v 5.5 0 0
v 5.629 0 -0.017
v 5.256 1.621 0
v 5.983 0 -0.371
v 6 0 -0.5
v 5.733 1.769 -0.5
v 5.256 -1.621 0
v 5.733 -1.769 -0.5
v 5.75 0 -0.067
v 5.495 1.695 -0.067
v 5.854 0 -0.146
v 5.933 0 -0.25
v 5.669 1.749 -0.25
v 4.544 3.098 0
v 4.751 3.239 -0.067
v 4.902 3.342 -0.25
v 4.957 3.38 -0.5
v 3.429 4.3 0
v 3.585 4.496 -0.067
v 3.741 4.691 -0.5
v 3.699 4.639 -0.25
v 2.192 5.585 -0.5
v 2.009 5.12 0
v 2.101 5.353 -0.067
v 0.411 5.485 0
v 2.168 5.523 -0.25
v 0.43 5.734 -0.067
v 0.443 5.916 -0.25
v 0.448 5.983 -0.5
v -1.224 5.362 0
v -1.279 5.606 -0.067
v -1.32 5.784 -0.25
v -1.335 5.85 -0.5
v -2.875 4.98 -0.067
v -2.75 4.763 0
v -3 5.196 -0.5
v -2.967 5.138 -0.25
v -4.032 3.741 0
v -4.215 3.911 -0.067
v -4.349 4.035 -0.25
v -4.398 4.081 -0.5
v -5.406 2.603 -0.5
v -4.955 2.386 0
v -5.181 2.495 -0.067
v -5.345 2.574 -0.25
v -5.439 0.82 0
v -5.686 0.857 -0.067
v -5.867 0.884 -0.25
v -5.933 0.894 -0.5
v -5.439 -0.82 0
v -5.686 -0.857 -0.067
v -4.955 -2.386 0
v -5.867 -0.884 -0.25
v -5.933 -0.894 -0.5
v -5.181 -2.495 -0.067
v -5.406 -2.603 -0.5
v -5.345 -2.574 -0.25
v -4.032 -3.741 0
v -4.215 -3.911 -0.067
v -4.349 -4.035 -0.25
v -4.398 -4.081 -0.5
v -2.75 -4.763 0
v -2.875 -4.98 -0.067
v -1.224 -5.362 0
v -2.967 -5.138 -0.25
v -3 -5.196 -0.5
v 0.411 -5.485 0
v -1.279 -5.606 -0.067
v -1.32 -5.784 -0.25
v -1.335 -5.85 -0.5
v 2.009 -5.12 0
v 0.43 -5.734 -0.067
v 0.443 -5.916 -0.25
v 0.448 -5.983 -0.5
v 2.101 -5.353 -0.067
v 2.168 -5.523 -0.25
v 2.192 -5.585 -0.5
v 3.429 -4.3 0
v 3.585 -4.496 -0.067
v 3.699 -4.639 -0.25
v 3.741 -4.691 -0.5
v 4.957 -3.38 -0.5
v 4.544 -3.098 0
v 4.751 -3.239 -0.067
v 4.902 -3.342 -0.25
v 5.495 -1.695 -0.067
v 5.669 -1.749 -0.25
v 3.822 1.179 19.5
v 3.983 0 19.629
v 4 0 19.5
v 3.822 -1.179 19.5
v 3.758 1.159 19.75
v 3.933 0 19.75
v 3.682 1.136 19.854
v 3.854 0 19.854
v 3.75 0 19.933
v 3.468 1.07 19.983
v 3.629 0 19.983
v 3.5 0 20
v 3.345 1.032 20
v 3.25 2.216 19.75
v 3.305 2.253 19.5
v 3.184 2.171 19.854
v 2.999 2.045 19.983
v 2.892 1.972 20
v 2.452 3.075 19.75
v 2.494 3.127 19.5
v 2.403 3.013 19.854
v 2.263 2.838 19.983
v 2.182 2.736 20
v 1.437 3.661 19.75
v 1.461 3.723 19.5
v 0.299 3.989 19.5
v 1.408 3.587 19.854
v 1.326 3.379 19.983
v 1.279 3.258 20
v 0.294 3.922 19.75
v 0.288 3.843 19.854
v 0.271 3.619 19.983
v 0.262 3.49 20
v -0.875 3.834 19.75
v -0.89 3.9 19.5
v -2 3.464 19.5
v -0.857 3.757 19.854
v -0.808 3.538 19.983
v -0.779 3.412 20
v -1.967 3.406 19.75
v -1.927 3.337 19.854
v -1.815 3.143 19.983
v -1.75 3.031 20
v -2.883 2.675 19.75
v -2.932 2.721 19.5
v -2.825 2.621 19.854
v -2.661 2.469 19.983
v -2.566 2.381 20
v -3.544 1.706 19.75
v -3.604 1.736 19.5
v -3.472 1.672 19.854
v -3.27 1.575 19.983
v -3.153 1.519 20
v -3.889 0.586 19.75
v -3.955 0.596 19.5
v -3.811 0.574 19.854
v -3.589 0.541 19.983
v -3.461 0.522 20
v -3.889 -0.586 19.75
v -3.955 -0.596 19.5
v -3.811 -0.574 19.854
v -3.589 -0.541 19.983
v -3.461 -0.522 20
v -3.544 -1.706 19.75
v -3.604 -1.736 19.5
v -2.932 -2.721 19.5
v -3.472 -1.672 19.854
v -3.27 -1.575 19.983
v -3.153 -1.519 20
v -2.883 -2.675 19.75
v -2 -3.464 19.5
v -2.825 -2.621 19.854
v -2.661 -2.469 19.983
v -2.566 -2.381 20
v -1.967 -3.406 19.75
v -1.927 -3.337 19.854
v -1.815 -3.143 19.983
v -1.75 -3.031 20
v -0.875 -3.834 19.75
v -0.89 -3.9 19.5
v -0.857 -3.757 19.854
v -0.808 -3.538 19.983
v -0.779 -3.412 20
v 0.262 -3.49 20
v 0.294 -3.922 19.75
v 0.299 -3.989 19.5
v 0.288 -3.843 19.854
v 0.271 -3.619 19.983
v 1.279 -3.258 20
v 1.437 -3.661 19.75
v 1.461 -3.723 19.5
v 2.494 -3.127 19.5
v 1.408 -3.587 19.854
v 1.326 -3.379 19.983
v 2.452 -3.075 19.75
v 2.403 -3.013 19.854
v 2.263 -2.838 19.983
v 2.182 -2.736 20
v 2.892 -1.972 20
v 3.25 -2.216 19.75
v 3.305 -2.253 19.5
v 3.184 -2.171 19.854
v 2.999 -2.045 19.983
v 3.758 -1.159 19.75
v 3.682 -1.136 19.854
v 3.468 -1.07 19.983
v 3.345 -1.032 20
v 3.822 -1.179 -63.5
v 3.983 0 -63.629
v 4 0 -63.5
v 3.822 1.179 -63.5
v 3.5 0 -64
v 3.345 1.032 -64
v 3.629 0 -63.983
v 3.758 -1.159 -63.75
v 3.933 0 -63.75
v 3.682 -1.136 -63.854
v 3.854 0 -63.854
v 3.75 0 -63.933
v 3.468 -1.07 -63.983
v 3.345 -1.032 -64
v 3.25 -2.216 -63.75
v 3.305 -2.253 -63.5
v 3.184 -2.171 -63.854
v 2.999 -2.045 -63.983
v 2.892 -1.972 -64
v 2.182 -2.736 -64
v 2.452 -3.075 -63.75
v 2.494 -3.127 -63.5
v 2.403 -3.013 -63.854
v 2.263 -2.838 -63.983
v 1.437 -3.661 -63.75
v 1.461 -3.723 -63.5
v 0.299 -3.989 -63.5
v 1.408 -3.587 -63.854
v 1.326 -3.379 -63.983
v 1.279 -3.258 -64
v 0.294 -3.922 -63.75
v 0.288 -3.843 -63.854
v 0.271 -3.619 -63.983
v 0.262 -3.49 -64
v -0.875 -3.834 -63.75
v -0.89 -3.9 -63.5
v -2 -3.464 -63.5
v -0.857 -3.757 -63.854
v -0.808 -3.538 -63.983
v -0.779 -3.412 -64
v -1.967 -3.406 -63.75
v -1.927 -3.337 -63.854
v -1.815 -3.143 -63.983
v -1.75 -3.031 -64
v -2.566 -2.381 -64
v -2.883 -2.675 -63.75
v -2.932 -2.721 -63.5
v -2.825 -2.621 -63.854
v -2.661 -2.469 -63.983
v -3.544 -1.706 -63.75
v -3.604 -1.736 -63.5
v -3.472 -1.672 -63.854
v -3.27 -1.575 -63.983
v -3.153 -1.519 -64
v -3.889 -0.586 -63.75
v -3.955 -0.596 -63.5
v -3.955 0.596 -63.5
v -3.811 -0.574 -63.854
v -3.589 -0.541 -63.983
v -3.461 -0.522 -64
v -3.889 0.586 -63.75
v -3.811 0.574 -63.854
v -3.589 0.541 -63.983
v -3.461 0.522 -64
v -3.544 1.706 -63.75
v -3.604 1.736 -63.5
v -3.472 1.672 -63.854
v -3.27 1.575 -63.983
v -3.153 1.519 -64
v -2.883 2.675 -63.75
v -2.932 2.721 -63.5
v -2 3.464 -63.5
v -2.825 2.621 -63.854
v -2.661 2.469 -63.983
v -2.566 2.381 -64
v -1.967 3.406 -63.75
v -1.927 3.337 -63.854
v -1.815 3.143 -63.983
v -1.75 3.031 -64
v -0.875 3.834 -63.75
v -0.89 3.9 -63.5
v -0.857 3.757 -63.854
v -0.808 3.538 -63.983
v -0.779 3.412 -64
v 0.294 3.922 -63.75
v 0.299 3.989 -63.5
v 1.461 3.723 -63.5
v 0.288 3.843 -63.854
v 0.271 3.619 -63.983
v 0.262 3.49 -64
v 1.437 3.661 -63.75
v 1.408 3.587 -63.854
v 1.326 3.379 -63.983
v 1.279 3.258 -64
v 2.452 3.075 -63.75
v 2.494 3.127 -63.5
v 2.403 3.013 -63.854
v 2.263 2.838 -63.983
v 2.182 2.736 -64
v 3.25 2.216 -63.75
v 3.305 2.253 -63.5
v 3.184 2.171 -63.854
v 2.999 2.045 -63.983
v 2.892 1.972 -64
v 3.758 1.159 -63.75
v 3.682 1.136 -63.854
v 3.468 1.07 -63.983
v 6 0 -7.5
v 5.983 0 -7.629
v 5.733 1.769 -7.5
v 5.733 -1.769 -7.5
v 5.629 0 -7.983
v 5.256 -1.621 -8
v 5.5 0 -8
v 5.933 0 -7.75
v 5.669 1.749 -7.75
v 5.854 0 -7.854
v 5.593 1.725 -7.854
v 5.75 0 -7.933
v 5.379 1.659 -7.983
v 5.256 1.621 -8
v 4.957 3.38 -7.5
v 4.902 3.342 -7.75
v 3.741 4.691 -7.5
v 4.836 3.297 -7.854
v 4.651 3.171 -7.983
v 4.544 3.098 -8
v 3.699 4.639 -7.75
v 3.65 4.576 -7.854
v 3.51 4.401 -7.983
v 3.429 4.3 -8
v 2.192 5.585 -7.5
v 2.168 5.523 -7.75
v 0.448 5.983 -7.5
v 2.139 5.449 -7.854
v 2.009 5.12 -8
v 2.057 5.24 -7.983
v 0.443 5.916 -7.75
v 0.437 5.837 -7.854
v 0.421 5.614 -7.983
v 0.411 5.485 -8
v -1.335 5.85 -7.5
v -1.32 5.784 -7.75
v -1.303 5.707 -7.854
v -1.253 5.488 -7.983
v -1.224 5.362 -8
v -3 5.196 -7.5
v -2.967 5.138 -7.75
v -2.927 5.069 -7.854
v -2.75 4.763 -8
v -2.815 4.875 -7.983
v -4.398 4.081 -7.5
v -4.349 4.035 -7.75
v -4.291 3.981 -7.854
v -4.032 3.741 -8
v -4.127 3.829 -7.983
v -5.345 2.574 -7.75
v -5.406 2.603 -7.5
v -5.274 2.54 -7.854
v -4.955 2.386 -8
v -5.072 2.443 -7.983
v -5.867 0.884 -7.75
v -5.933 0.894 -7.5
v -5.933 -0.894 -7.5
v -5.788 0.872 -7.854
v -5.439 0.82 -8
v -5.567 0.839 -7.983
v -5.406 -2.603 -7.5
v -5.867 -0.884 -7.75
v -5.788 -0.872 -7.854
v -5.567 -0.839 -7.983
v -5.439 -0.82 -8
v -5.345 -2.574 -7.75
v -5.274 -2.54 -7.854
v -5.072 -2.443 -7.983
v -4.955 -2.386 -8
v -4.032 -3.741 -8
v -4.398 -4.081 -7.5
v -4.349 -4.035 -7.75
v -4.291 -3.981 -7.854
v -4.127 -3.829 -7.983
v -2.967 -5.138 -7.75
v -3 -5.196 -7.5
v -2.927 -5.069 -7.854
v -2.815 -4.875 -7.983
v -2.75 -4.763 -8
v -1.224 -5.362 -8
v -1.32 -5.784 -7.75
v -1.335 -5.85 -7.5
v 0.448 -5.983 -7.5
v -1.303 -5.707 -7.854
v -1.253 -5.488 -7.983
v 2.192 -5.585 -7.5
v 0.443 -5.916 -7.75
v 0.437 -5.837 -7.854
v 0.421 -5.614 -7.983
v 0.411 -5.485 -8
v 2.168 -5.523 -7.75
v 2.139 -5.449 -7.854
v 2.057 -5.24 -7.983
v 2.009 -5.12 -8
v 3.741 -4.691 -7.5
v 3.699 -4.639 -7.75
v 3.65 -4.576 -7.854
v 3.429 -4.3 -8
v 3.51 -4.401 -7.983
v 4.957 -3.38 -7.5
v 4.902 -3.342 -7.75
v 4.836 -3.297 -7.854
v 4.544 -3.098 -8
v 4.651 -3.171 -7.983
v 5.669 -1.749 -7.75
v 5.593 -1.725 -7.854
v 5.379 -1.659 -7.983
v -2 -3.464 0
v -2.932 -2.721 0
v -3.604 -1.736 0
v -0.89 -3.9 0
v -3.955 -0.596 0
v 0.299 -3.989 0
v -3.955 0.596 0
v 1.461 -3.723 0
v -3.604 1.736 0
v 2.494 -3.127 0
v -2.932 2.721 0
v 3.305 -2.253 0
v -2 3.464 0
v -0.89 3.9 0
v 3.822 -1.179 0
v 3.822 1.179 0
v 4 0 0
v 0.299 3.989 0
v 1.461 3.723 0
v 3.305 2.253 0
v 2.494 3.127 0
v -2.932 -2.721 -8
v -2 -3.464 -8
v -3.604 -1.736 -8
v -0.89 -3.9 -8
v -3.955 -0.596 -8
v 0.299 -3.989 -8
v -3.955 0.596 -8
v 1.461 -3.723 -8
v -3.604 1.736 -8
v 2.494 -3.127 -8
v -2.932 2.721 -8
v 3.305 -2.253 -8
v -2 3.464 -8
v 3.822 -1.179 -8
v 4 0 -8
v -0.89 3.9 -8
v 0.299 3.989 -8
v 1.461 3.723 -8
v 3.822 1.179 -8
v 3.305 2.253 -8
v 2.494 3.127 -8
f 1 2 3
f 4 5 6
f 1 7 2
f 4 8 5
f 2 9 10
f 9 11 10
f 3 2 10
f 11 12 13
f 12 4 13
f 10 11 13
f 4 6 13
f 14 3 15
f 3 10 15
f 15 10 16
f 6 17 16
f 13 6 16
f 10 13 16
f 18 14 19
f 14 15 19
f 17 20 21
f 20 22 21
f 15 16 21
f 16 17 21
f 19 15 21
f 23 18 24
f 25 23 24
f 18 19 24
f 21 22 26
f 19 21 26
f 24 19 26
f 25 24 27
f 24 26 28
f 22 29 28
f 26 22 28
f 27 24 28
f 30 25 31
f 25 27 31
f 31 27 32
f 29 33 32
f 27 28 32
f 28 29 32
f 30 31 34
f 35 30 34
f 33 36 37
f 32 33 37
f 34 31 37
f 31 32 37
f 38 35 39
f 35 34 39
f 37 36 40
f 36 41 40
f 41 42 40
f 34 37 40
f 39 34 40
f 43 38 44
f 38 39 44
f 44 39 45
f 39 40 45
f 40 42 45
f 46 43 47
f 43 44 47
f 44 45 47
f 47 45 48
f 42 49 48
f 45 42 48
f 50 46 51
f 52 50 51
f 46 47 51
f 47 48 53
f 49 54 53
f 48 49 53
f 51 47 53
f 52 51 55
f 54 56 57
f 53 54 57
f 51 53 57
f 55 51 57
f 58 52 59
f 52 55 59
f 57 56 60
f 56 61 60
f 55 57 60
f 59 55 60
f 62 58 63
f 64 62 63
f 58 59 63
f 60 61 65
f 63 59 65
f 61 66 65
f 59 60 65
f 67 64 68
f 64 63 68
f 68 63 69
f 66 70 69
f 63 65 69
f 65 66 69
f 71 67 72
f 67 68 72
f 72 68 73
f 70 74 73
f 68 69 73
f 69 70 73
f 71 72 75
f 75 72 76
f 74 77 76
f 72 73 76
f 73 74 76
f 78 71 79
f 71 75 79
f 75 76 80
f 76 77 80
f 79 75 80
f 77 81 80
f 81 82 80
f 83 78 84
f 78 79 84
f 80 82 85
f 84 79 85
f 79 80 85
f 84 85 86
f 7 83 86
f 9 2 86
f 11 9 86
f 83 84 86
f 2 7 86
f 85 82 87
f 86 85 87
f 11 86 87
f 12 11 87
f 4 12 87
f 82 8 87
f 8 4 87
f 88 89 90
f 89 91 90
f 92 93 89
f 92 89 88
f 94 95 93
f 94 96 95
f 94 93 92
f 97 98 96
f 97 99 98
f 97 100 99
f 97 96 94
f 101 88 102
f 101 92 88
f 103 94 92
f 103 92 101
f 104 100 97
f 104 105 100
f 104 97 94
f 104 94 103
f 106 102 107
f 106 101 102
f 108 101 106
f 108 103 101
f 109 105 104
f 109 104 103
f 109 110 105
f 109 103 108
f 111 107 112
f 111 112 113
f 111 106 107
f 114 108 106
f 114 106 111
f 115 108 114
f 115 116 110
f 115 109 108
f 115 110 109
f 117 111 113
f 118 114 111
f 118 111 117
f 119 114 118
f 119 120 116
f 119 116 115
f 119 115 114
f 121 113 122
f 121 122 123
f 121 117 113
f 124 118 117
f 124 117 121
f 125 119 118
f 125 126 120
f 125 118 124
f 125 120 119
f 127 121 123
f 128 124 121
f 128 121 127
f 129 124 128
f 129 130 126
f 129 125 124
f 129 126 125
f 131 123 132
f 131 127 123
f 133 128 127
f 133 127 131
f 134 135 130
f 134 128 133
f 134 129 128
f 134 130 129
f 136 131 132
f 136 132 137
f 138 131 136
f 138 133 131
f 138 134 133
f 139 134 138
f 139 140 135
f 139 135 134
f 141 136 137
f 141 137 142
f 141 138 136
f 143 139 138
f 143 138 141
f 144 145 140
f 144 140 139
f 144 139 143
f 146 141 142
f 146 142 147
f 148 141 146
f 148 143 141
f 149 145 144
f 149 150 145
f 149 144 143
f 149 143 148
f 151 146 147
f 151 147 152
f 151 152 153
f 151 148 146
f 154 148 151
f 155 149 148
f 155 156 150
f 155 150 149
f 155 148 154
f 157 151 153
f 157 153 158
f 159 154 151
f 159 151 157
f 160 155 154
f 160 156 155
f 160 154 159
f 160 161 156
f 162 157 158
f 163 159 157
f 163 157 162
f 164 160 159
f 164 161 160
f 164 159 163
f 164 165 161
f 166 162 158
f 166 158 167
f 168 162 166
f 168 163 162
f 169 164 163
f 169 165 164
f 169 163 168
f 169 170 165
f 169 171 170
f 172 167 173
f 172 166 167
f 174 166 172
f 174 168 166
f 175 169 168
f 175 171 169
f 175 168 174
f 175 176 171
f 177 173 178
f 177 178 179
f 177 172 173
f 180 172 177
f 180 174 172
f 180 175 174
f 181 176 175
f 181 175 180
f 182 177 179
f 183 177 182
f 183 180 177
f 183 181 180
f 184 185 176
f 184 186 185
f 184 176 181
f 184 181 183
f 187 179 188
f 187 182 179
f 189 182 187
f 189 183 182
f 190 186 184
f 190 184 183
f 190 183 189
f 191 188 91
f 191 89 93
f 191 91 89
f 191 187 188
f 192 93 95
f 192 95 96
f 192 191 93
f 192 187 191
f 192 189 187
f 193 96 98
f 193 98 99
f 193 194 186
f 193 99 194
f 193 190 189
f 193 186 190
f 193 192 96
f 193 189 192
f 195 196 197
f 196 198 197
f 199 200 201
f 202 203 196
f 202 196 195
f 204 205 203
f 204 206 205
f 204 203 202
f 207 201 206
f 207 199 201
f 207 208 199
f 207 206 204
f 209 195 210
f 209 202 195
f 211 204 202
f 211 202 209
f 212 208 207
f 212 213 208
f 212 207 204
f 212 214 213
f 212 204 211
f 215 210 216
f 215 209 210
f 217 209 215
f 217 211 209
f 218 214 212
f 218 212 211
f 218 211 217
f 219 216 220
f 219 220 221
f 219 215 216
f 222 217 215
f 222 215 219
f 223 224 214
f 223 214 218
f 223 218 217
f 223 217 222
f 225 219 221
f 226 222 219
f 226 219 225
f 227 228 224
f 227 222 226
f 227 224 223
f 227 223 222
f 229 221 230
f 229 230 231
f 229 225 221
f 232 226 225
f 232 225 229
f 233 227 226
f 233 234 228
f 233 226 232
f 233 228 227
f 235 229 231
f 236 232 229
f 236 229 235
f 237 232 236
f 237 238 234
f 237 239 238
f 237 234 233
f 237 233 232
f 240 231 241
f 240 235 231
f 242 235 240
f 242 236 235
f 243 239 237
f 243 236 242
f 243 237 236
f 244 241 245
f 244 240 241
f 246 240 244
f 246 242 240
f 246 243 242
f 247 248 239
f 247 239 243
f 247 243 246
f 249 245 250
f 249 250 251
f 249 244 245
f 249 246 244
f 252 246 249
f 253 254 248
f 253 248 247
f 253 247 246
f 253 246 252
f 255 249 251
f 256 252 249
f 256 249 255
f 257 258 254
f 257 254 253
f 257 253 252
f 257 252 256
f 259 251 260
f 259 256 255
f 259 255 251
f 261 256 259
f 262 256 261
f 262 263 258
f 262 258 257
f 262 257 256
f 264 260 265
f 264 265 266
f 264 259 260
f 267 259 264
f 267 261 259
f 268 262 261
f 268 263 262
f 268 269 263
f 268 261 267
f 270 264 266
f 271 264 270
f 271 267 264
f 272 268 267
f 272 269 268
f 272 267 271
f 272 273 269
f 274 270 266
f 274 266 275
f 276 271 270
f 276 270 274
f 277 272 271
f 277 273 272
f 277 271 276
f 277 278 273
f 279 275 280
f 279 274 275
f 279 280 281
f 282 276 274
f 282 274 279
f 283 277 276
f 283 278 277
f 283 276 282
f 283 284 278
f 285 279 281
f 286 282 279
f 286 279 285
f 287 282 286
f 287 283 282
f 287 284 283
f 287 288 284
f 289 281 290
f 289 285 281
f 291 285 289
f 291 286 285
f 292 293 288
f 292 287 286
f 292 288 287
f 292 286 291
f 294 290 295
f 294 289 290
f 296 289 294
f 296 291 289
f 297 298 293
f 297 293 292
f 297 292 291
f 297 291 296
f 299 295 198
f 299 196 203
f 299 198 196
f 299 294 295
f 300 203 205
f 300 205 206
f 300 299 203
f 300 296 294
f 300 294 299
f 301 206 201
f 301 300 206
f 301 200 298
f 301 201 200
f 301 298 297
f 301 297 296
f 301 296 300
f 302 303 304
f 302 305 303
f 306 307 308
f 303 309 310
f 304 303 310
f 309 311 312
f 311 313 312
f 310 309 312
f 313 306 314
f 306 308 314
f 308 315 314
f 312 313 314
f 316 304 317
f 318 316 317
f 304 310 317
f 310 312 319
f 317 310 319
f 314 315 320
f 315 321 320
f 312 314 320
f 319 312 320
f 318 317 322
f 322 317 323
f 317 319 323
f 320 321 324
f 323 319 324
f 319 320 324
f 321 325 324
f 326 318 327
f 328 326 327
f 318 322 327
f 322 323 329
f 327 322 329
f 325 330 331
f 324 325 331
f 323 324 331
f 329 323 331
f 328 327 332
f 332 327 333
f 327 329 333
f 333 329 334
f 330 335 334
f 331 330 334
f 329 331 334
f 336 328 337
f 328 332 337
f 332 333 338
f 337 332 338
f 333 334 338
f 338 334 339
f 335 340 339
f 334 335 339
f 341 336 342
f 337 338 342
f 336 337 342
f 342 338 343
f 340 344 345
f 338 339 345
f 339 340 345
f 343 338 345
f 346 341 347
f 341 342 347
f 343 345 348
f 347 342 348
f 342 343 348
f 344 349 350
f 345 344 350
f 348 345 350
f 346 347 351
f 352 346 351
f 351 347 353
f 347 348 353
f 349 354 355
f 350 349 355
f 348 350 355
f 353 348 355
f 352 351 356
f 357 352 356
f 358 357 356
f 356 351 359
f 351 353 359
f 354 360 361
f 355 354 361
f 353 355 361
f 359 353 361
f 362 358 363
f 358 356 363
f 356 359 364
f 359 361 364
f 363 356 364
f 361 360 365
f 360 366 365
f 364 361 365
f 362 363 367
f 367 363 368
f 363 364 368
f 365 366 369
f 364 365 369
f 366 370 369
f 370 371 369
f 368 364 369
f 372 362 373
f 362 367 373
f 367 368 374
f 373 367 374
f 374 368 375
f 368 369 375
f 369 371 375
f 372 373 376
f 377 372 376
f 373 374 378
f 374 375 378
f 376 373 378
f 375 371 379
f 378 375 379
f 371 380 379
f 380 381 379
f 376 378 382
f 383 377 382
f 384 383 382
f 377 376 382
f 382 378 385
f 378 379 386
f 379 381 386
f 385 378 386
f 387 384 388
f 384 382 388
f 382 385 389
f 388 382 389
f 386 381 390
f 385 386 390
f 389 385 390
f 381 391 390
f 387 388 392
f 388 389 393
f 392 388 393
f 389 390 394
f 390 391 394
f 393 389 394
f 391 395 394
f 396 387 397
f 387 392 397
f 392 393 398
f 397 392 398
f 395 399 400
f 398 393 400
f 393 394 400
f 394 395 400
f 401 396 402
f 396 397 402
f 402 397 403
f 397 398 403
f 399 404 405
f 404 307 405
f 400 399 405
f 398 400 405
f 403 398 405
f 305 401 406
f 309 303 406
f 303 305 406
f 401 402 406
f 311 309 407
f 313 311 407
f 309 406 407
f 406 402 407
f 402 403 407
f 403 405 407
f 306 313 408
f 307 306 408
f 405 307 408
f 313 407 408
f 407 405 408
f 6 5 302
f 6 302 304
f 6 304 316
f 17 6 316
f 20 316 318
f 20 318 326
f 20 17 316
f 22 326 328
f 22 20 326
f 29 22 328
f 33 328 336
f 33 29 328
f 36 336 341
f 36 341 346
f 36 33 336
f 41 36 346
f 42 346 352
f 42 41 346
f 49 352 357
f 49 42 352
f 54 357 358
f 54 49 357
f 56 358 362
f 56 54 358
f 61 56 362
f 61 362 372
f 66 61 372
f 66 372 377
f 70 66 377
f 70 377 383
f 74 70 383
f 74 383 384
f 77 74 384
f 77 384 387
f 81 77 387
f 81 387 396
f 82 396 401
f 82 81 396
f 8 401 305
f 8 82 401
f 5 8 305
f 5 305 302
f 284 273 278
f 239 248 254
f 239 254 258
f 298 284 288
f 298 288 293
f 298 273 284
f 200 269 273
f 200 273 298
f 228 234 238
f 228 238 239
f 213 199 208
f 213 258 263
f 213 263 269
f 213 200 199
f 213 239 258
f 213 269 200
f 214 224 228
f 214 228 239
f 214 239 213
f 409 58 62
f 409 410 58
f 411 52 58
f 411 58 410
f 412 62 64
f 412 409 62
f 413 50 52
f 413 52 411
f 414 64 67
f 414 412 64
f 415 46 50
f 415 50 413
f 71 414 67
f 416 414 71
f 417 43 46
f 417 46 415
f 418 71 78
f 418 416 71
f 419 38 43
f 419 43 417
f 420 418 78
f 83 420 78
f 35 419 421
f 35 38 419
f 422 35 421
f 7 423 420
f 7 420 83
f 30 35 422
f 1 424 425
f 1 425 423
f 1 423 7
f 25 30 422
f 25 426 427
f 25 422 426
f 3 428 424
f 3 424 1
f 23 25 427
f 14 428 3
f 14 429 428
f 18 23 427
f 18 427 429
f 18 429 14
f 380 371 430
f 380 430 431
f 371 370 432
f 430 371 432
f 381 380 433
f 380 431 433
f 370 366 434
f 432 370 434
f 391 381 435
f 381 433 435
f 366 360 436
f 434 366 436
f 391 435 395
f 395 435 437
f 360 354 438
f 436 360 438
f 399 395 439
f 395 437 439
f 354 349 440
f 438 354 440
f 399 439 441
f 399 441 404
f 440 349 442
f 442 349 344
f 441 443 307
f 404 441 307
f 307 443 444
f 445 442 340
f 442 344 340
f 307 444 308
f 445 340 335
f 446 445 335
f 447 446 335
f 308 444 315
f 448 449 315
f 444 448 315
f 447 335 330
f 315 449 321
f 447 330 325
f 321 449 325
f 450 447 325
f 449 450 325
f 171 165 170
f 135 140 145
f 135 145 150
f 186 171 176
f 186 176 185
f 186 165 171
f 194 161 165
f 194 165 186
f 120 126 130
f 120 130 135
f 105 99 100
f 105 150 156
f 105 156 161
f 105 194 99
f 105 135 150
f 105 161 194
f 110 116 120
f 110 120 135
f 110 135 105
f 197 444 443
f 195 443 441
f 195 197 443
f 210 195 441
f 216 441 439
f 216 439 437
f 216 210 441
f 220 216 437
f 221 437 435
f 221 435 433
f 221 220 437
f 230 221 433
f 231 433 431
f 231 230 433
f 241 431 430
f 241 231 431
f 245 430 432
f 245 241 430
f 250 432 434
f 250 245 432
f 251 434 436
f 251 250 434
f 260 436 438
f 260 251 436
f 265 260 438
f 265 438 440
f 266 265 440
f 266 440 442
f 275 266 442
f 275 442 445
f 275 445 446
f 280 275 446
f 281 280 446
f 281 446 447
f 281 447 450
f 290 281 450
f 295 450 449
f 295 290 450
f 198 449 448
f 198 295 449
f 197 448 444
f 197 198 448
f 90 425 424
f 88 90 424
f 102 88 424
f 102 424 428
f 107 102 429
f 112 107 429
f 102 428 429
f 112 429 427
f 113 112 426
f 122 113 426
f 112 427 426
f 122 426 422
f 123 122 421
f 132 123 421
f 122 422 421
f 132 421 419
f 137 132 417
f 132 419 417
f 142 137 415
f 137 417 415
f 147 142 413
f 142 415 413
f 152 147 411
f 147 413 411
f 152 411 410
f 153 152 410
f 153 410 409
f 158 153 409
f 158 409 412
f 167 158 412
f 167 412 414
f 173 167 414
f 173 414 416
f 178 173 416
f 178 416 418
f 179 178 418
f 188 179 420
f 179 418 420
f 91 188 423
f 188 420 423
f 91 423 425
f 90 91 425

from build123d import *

# Parameters (mm, degrees)
SKETCH_1_R      = 4
EXTRUDE_1_DEPTH = 20
SKETCH_2_R      = 6
EXTRUDE_2_DEPTH = 8
EXTRUDE_START   = 56
SKETCH_3_R      = 4
EXTRUDE_5_DEPTH = 56
FILLET_1_R      = 0.5
FILLET_2_R      = 0.5


with BuildPart() as part:
    # 草图1 → 凸台-拉伸1 (new body)
    with BuildSketch(Plane.XY):
        Circle(SKETCH_1_R)
    extrude(amount=EXTRUDE_1_DEPTH)

    # 草图2 → 凸台-拉伸2 (add)
    with BuildSketch(Plane.XY):
        Circle(SKETCH_2_R)
    extrude(amount=-EXTRUDE_2_DEPTH)

    # 草图3 → 凸台-拉伸5 (add)
    with BuildSketch(Plane(origin=(0, 0, -8), x_dir=(-1, 0, 0), z_dir=(0, 0, -1)).offset(EXTRUDE_START)):
        with Locations(Location((0, 0, 0), (0, 0, 180))):
            Circle(SKETCH_3_R)
    extrude(amount=-EXTRUDE_5_DEPTH)

    # 圆角1
    fillet_1_edges = [part.edges().sort_by_distance(p)[0] for p in [
        (-4, 0, 20),
    ]]
    fillet(fillet_1_edges, radius=FILLET_1_R)

    # 圆角2
    fillet_2_edges = [part.edges().sort_by_distance(p)[0] for p in [
        (-4, 0, -64),
        (-6, 0, 0),
        (-6, 0, -8),
    ]]
    fillet(fillet_2_edges, radius=FILLET_2_R)


solid = part.part
